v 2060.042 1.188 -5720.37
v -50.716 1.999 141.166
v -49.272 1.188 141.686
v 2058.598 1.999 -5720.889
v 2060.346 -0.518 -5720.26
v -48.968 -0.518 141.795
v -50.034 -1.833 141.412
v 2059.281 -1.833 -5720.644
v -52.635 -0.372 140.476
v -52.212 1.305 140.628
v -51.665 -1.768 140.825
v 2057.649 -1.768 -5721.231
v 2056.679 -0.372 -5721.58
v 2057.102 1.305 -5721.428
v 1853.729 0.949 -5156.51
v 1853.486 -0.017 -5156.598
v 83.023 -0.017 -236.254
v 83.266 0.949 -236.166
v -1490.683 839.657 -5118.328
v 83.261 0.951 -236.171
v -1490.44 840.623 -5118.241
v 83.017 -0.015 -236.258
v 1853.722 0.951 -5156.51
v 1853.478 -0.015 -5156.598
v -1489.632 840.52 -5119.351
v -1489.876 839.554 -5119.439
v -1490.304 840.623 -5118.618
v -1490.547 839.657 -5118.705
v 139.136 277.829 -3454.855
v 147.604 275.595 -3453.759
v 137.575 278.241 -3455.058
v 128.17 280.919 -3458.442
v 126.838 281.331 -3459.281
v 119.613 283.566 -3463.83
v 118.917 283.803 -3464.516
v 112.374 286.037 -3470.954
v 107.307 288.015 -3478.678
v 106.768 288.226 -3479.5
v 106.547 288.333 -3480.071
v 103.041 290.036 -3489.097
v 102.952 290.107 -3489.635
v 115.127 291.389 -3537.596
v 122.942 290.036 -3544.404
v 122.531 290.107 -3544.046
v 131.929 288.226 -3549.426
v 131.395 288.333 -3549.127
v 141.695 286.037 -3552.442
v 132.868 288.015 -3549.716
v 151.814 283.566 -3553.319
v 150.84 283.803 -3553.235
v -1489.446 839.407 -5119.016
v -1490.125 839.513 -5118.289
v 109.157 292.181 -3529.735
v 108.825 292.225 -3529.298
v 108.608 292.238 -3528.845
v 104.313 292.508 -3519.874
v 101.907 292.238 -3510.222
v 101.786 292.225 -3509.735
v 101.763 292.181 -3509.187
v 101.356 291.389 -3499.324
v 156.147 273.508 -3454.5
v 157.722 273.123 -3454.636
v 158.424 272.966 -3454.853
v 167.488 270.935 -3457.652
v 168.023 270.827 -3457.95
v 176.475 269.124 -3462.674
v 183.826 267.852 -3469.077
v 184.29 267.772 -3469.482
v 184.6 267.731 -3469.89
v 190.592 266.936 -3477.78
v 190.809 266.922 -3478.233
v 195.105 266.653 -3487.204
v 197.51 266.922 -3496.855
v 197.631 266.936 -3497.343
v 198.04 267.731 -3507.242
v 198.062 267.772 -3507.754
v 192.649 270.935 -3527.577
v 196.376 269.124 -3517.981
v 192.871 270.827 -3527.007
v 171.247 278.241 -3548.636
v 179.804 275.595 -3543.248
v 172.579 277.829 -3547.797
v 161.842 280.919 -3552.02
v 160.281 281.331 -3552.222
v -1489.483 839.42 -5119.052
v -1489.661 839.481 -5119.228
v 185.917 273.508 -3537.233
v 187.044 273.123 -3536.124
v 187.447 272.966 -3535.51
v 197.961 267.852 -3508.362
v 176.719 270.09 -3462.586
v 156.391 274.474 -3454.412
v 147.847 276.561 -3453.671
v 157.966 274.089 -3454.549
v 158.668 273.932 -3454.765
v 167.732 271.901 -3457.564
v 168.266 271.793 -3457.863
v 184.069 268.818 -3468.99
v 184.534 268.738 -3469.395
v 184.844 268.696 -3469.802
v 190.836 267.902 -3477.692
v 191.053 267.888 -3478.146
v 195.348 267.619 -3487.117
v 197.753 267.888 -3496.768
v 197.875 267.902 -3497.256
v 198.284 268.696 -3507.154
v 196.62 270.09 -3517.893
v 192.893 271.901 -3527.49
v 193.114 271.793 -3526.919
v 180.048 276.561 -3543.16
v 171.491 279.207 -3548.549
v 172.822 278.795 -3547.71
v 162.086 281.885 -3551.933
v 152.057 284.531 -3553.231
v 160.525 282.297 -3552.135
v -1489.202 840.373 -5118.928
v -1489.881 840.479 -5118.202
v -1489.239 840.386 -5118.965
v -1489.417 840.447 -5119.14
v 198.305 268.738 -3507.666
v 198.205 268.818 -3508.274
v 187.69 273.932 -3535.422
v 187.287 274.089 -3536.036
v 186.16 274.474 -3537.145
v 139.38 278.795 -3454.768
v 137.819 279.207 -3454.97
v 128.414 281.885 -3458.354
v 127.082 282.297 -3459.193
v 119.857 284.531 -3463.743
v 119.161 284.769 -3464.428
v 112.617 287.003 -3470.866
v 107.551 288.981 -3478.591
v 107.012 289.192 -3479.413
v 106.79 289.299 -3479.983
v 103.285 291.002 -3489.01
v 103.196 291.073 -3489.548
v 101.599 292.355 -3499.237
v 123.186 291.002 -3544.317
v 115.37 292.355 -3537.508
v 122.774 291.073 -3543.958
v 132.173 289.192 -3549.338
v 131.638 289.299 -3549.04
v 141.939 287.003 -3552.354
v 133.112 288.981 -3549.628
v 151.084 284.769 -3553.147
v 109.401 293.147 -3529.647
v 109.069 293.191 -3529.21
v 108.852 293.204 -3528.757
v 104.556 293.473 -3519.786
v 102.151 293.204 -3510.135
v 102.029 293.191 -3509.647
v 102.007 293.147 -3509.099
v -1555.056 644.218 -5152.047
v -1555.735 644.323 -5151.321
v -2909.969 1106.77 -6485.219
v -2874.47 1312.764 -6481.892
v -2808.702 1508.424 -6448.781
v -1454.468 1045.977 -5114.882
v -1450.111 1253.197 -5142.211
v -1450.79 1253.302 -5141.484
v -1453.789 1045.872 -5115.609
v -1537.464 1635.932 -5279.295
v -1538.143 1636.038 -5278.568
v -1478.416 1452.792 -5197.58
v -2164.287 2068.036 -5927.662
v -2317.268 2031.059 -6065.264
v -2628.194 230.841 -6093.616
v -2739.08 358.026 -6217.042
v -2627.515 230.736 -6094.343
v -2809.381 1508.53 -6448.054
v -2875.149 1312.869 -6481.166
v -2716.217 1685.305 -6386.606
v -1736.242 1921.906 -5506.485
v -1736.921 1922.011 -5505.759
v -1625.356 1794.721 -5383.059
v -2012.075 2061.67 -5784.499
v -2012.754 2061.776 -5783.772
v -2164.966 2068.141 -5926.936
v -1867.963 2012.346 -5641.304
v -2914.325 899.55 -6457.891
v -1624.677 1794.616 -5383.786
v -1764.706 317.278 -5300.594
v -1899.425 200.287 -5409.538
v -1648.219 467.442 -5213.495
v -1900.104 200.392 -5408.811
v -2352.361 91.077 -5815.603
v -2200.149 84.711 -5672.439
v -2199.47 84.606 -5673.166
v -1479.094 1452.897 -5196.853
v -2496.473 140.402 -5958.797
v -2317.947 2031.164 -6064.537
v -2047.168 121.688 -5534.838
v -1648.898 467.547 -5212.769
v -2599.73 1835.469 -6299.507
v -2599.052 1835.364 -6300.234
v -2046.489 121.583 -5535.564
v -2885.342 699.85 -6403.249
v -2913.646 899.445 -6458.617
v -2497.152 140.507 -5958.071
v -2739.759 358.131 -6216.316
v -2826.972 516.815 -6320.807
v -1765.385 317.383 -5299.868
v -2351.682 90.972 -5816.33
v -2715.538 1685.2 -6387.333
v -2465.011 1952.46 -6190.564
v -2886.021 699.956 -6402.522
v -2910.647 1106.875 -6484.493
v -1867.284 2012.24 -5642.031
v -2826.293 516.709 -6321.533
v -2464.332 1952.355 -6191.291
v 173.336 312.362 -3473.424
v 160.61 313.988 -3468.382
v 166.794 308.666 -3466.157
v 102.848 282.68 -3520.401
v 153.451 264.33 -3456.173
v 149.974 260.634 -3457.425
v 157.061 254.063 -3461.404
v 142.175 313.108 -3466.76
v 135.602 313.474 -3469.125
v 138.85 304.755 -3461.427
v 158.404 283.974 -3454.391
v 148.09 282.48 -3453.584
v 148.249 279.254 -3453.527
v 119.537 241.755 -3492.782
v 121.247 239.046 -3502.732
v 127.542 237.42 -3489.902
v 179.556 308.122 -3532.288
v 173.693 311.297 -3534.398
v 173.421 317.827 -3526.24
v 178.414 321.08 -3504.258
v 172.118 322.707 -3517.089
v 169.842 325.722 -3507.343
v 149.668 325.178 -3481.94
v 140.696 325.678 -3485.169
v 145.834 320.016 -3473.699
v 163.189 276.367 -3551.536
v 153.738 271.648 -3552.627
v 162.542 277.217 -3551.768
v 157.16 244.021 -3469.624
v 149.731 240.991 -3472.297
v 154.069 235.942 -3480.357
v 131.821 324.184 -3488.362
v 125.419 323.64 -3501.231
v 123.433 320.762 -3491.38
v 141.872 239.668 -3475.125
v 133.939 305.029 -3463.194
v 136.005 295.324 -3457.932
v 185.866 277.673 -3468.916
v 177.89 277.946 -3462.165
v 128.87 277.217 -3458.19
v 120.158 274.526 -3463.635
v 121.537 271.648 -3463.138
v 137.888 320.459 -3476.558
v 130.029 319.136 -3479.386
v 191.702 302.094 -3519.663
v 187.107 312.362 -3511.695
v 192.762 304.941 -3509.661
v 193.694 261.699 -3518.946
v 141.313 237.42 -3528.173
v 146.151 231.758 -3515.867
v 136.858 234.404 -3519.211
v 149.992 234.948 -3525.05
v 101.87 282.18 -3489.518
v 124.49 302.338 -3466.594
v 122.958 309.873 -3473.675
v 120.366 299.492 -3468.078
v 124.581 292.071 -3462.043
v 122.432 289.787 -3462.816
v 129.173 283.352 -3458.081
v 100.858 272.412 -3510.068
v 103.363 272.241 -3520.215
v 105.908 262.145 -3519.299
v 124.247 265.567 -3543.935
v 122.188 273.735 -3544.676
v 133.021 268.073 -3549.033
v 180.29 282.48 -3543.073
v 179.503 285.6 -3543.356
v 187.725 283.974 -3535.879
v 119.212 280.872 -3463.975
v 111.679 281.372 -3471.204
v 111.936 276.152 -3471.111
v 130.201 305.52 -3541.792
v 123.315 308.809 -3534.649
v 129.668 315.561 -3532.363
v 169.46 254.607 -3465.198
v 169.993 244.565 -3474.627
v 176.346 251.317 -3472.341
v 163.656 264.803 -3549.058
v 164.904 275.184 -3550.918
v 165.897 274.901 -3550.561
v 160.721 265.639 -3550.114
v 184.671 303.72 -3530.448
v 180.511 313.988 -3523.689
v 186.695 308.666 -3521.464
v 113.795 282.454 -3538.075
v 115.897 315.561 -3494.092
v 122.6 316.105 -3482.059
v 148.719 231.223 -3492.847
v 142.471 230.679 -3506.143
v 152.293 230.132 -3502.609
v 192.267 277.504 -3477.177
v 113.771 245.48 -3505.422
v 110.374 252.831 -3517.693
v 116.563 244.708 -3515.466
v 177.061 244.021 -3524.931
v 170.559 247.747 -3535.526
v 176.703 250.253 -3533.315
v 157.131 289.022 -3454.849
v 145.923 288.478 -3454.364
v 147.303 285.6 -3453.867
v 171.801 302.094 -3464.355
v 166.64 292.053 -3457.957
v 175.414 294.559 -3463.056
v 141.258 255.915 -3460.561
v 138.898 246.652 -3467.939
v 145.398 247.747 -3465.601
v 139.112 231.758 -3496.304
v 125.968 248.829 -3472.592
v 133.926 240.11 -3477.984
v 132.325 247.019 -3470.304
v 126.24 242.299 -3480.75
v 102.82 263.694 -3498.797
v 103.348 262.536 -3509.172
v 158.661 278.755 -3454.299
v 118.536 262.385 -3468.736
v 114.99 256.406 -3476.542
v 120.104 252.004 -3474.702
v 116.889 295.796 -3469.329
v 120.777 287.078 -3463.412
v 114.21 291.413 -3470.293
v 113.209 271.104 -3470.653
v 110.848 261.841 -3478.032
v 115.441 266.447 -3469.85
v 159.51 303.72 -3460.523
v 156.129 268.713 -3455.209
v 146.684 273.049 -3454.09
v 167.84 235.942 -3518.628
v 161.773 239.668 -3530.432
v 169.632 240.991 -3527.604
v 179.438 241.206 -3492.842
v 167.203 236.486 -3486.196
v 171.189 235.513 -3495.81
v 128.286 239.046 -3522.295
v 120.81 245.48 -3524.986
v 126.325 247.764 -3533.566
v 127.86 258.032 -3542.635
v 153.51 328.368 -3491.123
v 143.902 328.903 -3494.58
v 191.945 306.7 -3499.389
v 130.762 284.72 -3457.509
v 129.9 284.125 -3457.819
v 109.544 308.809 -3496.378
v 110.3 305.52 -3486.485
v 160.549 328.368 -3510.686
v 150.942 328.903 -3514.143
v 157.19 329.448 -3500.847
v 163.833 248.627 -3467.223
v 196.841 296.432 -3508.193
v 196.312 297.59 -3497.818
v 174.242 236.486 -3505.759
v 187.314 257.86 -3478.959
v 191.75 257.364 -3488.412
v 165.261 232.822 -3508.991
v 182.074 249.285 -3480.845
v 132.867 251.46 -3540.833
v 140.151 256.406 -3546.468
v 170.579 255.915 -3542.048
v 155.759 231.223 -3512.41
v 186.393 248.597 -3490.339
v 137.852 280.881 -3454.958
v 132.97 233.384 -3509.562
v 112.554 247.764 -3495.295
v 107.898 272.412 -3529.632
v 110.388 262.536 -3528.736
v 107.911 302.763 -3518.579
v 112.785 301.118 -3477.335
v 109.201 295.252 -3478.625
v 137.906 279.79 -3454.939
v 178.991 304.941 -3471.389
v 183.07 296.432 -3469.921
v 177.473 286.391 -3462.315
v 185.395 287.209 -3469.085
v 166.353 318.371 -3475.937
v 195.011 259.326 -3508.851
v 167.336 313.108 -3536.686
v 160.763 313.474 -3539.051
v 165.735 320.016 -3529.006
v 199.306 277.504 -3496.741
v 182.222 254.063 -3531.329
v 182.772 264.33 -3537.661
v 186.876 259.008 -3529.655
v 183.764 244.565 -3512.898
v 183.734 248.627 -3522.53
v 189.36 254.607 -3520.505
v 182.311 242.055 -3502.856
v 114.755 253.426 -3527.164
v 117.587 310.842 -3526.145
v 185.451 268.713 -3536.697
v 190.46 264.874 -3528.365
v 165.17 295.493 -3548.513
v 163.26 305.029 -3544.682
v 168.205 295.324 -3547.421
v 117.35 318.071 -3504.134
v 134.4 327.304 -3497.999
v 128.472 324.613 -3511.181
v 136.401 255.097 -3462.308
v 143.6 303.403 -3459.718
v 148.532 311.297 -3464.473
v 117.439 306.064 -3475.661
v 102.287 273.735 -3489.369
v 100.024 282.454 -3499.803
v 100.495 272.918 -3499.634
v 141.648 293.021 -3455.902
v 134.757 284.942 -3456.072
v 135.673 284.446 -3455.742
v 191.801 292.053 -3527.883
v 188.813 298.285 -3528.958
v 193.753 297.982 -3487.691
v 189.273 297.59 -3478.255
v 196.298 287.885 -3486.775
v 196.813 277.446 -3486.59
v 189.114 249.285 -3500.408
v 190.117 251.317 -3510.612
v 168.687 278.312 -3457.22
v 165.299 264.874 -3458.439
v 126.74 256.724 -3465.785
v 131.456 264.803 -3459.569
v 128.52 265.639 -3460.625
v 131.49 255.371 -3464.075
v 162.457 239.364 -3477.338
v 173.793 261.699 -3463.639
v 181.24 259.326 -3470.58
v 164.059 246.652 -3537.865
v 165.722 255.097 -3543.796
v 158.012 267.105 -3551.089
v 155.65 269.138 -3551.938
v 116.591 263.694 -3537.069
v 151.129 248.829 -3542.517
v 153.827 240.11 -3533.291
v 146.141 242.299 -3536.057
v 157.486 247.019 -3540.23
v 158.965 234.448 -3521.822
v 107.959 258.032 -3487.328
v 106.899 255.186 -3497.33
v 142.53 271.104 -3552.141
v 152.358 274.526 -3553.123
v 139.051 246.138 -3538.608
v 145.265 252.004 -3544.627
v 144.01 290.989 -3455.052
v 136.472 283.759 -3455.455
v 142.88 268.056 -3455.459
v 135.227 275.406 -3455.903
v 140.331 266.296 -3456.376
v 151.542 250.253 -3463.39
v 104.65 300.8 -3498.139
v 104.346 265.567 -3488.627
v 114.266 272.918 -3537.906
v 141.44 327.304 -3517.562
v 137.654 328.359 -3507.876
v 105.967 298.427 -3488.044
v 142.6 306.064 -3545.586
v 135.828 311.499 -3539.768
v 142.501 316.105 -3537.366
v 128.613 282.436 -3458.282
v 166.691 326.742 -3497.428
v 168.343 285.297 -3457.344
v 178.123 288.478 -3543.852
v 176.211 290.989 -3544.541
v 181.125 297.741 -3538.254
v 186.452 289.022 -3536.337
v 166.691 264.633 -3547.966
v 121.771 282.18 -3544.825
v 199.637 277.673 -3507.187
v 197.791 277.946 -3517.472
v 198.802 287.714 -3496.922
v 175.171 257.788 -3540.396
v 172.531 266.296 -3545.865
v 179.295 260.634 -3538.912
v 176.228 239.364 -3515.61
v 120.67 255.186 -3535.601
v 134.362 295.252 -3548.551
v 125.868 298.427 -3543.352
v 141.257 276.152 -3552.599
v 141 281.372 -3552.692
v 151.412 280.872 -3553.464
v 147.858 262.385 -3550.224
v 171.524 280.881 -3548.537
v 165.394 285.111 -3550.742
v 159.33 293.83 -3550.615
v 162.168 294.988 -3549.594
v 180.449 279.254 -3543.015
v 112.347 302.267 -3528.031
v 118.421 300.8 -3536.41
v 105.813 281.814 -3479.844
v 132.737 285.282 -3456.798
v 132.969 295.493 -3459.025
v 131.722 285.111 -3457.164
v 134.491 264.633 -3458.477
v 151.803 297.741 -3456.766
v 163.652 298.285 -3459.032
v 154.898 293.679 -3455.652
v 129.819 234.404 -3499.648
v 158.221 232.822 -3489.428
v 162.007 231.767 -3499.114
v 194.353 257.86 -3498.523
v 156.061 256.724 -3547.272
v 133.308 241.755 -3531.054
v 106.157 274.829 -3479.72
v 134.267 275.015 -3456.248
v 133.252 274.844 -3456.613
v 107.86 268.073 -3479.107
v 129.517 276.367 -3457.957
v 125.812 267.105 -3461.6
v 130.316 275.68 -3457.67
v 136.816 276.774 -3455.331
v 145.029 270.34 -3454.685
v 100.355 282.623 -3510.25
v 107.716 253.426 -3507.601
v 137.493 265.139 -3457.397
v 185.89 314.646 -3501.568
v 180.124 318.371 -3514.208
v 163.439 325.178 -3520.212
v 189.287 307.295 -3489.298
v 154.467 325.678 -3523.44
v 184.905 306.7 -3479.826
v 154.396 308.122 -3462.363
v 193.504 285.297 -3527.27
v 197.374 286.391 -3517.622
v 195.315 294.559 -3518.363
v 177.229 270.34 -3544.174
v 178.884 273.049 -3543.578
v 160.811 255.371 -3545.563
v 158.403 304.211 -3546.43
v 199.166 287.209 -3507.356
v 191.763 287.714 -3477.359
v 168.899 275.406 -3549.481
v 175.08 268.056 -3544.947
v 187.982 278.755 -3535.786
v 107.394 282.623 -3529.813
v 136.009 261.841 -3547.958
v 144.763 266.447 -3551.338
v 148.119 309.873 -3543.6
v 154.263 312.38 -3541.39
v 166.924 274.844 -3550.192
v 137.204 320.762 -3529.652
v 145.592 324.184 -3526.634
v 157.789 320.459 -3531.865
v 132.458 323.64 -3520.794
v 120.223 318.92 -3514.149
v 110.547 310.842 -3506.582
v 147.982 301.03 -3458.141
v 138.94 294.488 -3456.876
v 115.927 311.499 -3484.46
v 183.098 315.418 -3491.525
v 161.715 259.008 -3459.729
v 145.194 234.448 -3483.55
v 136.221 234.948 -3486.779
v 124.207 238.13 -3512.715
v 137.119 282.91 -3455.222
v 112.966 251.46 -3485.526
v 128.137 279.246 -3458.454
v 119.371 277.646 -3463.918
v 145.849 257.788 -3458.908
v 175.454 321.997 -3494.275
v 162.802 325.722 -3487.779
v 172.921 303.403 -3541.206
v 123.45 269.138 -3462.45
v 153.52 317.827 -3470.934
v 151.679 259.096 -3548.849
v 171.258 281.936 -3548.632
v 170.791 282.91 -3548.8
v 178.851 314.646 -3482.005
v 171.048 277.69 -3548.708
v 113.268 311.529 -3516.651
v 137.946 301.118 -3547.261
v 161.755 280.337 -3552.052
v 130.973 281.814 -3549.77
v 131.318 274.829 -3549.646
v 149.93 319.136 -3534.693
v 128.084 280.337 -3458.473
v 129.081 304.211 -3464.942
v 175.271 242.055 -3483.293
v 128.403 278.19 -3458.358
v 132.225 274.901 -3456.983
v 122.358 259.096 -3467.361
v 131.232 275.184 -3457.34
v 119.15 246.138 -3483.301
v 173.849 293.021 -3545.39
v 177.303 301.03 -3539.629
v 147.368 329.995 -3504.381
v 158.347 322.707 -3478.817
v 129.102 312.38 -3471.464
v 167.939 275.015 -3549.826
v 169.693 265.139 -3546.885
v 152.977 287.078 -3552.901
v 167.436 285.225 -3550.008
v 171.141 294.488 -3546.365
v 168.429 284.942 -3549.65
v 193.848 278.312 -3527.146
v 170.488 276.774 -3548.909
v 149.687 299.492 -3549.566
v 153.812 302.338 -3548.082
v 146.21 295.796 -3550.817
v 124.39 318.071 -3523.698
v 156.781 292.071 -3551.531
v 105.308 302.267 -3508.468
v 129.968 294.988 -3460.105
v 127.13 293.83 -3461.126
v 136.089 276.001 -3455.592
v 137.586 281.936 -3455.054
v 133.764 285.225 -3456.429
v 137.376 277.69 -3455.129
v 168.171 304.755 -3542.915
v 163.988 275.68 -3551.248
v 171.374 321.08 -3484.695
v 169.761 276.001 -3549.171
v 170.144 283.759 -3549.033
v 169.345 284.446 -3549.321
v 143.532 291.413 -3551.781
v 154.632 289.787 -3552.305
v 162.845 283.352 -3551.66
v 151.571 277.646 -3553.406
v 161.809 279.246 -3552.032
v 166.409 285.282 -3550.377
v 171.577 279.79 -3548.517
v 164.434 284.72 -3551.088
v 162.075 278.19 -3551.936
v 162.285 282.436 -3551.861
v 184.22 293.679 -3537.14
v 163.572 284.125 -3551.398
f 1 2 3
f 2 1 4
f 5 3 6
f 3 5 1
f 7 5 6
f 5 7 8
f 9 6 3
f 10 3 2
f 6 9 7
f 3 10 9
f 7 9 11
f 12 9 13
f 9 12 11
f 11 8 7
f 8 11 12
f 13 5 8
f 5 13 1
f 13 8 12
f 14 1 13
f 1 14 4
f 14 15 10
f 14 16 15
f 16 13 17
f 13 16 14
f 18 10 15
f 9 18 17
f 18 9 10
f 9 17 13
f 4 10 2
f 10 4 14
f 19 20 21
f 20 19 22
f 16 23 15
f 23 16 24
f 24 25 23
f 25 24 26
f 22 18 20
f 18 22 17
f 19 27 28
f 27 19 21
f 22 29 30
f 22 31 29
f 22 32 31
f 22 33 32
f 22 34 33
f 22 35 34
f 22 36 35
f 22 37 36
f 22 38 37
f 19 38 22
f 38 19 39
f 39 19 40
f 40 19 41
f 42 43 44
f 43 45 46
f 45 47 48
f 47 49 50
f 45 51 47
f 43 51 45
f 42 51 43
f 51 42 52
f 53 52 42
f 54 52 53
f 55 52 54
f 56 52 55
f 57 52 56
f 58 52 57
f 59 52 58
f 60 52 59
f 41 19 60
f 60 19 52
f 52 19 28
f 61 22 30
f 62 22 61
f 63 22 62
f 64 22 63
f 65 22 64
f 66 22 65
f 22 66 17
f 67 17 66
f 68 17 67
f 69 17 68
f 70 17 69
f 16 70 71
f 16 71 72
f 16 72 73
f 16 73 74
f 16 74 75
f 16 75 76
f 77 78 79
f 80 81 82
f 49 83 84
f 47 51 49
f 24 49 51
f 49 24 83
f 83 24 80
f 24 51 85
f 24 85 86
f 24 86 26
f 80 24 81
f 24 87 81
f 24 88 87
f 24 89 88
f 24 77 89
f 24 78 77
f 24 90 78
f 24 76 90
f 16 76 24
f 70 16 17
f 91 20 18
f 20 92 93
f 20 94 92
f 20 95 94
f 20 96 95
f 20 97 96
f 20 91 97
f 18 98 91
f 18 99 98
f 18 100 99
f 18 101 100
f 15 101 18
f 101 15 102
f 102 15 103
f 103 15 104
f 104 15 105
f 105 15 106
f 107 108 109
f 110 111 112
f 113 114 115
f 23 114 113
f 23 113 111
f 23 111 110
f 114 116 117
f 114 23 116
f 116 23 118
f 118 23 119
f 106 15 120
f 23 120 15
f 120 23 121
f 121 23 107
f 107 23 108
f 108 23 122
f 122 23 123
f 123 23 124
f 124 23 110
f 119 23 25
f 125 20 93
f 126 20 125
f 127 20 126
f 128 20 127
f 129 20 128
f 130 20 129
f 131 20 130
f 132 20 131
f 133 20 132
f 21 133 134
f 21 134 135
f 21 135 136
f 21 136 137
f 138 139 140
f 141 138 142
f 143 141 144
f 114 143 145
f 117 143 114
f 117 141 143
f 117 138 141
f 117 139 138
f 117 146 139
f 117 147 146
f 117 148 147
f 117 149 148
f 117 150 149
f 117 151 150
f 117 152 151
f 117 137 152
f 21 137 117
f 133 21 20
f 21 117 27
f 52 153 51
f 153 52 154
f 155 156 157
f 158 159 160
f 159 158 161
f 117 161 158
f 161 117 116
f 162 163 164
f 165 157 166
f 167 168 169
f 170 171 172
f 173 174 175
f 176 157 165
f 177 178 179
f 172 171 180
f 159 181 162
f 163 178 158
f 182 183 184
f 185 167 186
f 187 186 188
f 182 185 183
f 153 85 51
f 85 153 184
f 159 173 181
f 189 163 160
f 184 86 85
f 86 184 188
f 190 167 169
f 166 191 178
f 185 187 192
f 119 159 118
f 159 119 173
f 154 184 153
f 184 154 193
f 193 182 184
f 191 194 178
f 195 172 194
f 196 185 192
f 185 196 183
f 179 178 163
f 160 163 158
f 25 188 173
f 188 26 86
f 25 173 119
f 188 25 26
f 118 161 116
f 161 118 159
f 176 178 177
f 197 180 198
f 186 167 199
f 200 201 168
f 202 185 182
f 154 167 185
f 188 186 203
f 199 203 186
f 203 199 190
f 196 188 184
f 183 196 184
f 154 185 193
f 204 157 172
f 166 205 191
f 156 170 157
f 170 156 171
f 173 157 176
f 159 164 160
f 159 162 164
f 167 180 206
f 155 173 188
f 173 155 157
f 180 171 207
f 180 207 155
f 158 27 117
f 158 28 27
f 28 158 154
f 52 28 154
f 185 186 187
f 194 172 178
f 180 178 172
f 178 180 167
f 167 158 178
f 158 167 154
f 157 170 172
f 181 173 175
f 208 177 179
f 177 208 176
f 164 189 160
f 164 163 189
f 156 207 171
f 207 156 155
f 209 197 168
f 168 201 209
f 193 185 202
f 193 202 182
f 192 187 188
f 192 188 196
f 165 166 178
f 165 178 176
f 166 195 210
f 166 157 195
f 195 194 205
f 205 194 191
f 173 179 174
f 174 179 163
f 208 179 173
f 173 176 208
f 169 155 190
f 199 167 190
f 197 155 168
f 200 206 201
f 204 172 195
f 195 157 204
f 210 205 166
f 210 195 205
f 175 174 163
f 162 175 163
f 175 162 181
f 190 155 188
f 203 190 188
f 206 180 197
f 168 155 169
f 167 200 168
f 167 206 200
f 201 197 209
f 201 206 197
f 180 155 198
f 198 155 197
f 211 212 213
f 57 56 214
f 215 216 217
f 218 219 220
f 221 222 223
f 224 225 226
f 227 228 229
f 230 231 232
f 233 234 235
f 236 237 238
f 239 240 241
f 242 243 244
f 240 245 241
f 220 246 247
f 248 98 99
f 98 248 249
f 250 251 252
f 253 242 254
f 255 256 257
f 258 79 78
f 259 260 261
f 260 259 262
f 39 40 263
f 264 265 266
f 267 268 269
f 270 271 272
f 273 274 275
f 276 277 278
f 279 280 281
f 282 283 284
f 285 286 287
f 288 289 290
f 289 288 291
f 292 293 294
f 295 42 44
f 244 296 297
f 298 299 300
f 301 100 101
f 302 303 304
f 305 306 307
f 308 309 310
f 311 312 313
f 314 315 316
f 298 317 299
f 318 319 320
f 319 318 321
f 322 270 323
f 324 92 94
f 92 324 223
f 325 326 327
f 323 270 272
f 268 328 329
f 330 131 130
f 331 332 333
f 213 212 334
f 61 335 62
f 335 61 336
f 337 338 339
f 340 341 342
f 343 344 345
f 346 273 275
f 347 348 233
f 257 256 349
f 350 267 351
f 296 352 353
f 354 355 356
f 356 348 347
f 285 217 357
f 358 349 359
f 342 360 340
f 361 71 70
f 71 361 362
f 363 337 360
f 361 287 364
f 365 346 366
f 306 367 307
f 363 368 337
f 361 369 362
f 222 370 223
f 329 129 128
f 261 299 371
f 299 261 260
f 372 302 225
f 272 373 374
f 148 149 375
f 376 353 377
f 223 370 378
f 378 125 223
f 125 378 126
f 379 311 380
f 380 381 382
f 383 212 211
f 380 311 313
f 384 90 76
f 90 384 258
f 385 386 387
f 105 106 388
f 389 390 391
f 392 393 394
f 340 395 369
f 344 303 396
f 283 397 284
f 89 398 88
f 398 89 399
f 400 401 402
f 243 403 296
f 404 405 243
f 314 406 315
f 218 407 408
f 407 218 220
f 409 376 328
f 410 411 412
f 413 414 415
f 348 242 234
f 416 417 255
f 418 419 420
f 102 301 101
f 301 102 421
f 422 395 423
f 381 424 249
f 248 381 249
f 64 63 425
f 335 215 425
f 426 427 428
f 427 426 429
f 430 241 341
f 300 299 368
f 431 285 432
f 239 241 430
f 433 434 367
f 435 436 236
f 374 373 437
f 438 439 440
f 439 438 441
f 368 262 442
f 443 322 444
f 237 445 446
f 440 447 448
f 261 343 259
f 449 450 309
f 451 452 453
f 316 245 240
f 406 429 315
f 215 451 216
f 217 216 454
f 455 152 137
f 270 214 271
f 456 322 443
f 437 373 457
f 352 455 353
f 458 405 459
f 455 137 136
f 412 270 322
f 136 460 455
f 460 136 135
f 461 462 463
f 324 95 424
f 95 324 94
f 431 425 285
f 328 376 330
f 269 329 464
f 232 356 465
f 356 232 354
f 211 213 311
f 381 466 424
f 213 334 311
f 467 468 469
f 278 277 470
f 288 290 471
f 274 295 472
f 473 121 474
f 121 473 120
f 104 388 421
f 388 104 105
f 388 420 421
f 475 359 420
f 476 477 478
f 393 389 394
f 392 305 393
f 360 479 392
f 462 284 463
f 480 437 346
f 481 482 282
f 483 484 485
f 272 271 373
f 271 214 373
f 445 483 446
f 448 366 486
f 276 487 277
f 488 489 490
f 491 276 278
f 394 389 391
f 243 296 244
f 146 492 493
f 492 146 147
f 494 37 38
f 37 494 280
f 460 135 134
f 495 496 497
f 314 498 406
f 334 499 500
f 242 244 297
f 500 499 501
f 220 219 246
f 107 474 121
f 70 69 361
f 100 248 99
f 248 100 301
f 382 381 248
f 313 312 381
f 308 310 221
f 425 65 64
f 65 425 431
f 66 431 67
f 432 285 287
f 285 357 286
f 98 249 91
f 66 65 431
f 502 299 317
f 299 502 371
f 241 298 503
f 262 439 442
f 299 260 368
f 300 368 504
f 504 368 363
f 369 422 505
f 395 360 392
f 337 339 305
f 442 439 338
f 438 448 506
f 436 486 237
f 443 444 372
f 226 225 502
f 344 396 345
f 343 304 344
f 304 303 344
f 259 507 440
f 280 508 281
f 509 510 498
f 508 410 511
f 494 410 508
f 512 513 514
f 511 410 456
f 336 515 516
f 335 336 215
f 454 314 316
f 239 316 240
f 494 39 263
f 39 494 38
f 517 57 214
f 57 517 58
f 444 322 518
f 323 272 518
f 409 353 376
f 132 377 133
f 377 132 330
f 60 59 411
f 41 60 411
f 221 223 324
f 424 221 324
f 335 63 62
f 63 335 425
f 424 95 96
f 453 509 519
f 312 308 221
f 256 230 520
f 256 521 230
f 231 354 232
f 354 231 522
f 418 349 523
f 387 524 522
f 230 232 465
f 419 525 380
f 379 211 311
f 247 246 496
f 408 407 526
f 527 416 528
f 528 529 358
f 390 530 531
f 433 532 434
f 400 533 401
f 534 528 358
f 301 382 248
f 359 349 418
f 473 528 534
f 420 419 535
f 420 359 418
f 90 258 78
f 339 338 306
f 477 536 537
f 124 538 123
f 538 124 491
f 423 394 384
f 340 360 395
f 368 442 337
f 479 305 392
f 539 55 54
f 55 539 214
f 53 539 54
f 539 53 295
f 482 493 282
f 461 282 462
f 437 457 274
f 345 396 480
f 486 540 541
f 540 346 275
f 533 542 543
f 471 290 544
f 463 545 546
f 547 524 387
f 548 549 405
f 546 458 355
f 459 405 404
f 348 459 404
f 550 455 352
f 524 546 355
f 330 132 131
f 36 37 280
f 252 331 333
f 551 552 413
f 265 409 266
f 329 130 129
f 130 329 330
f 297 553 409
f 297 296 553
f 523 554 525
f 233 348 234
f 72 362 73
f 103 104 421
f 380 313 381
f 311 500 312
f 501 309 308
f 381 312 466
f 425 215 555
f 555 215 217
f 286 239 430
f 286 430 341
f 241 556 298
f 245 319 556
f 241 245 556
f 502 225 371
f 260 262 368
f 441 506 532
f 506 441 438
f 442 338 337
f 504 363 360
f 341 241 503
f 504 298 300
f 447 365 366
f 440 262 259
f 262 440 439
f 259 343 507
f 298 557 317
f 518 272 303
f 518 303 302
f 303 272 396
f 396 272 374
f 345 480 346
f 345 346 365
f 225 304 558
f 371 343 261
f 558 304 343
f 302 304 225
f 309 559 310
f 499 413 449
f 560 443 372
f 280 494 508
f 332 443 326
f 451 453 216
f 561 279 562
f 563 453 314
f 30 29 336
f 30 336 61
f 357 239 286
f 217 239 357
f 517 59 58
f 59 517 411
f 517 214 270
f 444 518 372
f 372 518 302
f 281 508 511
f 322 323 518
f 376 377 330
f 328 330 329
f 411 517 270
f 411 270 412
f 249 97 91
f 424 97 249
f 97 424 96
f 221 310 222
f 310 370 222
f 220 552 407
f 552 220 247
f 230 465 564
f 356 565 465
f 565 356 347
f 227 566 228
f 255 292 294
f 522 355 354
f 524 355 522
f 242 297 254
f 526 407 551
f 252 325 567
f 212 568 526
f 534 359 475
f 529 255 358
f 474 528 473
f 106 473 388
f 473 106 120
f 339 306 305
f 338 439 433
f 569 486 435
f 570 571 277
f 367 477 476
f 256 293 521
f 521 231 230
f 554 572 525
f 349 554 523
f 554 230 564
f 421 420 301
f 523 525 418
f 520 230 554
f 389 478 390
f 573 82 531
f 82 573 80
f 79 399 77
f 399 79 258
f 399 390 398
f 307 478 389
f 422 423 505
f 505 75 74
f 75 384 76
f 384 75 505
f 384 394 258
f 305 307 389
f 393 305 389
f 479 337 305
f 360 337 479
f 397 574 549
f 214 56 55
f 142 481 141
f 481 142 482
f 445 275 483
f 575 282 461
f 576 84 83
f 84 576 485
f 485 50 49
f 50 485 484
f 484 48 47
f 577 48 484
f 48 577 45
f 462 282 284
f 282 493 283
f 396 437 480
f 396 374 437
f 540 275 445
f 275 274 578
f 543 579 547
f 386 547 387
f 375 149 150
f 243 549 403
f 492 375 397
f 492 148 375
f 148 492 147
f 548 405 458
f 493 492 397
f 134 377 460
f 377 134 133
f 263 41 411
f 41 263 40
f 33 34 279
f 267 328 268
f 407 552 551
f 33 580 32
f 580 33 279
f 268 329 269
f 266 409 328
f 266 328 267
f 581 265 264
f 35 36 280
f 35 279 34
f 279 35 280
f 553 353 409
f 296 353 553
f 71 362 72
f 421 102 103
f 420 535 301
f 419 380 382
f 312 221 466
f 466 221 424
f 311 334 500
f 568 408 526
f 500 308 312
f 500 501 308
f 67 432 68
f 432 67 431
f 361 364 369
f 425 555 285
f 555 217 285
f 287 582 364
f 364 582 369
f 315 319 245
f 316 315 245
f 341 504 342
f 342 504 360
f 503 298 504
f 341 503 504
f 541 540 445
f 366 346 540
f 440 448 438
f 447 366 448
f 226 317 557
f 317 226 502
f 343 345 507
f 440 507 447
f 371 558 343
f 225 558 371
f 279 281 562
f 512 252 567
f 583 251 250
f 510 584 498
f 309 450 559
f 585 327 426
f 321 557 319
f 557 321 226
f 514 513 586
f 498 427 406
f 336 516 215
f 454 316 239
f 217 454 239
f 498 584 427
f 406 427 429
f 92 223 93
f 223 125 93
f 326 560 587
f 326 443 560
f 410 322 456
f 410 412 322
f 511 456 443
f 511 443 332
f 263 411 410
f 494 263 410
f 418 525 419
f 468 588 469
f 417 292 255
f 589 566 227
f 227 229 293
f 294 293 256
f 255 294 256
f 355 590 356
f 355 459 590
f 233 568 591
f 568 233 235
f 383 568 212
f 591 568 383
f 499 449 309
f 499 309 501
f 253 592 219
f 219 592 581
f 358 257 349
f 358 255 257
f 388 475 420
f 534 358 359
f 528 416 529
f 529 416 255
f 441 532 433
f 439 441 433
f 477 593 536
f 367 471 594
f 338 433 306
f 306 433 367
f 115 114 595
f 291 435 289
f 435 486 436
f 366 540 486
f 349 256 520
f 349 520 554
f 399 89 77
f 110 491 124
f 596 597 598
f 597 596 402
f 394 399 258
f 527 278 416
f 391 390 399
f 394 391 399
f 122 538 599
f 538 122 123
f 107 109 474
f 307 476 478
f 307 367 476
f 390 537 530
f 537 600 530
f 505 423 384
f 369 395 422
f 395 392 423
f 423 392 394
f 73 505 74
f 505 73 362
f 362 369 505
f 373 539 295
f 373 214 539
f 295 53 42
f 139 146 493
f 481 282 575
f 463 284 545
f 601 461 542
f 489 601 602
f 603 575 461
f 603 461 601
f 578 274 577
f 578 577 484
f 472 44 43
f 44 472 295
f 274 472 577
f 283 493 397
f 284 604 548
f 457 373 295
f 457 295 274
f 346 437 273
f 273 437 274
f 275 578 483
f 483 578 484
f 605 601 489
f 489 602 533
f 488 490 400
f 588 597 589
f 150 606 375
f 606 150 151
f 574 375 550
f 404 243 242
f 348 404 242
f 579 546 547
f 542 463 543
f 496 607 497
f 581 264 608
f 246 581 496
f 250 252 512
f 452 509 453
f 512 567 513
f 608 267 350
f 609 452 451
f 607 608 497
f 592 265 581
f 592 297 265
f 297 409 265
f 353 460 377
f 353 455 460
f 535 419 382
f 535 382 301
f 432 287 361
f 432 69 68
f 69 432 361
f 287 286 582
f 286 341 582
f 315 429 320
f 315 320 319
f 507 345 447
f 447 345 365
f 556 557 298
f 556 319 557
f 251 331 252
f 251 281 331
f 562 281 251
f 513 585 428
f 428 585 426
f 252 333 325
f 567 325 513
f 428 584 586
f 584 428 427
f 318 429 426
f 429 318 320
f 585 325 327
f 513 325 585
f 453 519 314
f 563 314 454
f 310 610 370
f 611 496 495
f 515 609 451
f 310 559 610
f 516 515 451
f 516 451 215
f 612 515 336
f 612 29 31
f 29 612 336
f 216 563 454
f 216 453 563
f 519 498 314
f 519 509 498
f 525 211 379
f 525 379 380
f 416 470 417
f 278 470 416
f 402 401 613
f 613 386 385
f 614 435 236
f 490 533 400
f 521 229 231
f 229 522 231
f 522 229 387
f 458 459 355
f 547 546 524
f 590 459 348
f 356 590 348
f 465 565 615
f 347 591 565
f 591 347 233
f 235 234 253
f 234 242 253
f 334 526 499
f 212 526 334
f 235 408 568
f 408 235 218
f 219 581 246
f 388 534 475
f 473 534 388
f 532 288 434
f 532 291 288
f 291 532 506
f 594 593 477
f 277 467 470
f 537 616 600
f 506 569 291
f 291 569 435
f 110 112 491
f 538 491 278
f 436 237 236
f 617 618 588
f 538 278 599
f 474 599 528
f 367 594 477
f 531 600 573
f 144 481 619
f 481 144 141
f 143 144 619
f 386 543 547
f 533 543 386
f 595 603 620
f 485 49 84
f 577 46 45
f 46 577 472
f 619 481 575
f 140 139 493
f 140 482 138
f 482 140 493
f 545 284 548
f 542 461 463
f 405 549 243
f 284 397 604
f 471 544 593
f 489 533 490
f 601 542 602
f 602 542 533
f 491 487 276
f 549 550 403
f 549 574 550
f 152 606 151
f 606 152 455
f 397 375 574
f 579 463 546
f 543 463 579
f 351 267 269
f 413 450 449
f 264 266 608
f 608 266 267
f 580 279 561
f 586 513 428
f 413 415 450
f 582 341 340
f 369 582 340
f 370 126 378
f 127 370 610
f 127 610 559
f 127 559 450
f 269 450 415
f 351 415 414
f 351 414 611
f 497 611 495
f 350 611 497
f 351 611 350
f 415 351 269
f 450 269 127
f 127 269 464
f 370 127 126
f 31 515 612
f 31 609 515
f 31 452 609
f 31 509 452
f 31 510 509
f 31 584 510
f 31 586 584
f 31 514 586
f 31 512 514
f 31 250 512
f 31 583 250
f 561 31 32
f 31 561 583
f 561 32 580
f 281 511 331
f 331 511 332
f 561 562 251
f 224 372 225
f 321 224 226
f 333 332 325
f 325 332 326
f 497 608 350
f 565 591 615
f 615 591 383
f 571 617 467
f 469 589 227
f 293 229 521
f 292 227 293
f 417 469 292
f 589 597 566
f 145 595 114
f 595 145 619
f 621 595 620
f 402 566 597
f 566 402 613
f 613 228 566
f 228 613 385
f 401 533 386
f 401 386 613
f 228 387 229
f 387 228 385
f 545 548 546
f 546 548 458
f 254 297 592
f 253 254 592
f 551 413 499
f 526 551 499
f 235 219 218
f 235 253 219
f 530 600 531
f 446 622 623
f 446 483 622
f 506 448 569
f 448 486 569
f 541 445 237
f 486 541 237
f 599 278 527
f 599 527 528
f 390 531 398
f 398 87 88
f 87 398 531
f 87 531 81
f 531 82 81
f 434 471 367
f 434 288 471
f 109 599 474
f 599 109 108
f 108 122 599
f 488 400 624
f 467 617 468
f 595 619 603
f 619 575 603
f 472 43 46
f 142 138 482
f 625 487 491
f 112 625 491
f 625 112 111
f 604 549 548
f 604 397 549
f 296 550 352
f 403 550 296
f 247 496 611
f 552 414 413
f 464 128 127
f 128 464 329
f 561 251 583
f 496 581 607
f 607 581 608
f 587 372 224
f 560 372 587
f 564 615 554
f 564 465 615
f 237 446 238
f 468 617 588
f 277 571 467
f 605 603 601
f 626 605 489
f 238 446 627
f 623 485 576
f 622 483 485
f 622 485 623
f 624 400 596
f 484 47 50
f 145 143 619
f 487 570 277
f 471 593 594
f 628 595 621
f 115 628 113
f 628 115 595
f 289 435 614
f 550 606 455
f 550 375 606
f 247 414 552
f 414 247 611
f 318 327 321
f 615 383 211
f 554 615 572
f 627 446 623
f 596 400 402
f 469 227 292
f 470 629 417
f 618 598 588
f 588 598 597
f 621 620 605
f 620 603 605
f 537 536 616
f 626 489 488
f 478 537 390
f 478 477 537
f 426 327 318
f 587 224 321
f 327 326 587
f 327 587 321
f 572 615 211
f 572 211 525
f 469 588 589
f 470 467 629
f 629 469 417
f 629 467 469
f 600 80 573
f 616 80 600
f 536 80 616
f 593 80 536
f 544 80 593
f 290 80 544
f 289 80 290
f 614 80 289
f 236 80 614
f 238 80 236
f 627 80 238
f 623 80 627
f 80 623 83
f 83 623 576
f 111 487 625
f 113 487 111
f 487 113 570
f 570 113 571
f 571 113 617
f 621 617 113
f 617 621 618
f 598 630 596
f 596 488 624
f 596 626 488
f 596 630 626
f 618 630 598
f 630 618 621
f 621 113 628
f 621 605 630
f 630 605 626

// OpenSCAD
perShkat = 5230;
betta = 70.21;
nizhShkat = 3450;
mediGamma = 24;

aX = nizhShkat*sin(betta);
aZ = nizhShkat*cos(betta);
// echo( "aX = ", aX); // 3246
 echo( "aZ = ", aZ); //1168 
// Пузо 4%

cpX = aX/3;
cpZ = aZ/3 + perShkat/3;

//d1 = 500;

echo("area = ", perShkat*aX/2 * (1/1000000)); // 8.5 кв м

// высота паруса
echo (" h = " , perShkat * sin(betta)); // 4921


GollandecGenoa();

/* Упрощение!!! */


module GollandecGenoa() {
    
    rotate([ 0 , betta - 90 , 0 ])
    rotate([ 0 , 0 , -15 ])
    translate([ 0 , 0 , -perShkat-250  ])
    {

    translate([ 0 , 0 , -600 ])
    cylinder( h = perShkat + 1000 , d = 4 );

    hull() {

        //C 
        translate([ -1 , 0 , perShkat - 1 ])
        rotate([ 90 , 0 , 0 ])
        cylinder( h = 1, r = 1 , center=true );

        //B
        translate([ -1 , 0 , 1 ])
        rotate([ 90 , 0 , 0 ])
        cylinder( h = 1, r = 1 , center=true );

        //A
        translate([ 1 - aX , 0 , aZ ])
        rotate([ 90 , 0 , 0 ])
        cylinder( h = 1, r = 1 , center=true );

    }


    translate([ 1 - aX , 0 , aZ ])
    rotate([ 0 , -mediGamma , 0 ])
    translate([ -1000 , 0 , 0 ])
    cylinder( h = 1, r = 1000 , center=true );

    translate([ -cpX , 0 , cpZ ])
    sphere( r = 50 );
    }
}
